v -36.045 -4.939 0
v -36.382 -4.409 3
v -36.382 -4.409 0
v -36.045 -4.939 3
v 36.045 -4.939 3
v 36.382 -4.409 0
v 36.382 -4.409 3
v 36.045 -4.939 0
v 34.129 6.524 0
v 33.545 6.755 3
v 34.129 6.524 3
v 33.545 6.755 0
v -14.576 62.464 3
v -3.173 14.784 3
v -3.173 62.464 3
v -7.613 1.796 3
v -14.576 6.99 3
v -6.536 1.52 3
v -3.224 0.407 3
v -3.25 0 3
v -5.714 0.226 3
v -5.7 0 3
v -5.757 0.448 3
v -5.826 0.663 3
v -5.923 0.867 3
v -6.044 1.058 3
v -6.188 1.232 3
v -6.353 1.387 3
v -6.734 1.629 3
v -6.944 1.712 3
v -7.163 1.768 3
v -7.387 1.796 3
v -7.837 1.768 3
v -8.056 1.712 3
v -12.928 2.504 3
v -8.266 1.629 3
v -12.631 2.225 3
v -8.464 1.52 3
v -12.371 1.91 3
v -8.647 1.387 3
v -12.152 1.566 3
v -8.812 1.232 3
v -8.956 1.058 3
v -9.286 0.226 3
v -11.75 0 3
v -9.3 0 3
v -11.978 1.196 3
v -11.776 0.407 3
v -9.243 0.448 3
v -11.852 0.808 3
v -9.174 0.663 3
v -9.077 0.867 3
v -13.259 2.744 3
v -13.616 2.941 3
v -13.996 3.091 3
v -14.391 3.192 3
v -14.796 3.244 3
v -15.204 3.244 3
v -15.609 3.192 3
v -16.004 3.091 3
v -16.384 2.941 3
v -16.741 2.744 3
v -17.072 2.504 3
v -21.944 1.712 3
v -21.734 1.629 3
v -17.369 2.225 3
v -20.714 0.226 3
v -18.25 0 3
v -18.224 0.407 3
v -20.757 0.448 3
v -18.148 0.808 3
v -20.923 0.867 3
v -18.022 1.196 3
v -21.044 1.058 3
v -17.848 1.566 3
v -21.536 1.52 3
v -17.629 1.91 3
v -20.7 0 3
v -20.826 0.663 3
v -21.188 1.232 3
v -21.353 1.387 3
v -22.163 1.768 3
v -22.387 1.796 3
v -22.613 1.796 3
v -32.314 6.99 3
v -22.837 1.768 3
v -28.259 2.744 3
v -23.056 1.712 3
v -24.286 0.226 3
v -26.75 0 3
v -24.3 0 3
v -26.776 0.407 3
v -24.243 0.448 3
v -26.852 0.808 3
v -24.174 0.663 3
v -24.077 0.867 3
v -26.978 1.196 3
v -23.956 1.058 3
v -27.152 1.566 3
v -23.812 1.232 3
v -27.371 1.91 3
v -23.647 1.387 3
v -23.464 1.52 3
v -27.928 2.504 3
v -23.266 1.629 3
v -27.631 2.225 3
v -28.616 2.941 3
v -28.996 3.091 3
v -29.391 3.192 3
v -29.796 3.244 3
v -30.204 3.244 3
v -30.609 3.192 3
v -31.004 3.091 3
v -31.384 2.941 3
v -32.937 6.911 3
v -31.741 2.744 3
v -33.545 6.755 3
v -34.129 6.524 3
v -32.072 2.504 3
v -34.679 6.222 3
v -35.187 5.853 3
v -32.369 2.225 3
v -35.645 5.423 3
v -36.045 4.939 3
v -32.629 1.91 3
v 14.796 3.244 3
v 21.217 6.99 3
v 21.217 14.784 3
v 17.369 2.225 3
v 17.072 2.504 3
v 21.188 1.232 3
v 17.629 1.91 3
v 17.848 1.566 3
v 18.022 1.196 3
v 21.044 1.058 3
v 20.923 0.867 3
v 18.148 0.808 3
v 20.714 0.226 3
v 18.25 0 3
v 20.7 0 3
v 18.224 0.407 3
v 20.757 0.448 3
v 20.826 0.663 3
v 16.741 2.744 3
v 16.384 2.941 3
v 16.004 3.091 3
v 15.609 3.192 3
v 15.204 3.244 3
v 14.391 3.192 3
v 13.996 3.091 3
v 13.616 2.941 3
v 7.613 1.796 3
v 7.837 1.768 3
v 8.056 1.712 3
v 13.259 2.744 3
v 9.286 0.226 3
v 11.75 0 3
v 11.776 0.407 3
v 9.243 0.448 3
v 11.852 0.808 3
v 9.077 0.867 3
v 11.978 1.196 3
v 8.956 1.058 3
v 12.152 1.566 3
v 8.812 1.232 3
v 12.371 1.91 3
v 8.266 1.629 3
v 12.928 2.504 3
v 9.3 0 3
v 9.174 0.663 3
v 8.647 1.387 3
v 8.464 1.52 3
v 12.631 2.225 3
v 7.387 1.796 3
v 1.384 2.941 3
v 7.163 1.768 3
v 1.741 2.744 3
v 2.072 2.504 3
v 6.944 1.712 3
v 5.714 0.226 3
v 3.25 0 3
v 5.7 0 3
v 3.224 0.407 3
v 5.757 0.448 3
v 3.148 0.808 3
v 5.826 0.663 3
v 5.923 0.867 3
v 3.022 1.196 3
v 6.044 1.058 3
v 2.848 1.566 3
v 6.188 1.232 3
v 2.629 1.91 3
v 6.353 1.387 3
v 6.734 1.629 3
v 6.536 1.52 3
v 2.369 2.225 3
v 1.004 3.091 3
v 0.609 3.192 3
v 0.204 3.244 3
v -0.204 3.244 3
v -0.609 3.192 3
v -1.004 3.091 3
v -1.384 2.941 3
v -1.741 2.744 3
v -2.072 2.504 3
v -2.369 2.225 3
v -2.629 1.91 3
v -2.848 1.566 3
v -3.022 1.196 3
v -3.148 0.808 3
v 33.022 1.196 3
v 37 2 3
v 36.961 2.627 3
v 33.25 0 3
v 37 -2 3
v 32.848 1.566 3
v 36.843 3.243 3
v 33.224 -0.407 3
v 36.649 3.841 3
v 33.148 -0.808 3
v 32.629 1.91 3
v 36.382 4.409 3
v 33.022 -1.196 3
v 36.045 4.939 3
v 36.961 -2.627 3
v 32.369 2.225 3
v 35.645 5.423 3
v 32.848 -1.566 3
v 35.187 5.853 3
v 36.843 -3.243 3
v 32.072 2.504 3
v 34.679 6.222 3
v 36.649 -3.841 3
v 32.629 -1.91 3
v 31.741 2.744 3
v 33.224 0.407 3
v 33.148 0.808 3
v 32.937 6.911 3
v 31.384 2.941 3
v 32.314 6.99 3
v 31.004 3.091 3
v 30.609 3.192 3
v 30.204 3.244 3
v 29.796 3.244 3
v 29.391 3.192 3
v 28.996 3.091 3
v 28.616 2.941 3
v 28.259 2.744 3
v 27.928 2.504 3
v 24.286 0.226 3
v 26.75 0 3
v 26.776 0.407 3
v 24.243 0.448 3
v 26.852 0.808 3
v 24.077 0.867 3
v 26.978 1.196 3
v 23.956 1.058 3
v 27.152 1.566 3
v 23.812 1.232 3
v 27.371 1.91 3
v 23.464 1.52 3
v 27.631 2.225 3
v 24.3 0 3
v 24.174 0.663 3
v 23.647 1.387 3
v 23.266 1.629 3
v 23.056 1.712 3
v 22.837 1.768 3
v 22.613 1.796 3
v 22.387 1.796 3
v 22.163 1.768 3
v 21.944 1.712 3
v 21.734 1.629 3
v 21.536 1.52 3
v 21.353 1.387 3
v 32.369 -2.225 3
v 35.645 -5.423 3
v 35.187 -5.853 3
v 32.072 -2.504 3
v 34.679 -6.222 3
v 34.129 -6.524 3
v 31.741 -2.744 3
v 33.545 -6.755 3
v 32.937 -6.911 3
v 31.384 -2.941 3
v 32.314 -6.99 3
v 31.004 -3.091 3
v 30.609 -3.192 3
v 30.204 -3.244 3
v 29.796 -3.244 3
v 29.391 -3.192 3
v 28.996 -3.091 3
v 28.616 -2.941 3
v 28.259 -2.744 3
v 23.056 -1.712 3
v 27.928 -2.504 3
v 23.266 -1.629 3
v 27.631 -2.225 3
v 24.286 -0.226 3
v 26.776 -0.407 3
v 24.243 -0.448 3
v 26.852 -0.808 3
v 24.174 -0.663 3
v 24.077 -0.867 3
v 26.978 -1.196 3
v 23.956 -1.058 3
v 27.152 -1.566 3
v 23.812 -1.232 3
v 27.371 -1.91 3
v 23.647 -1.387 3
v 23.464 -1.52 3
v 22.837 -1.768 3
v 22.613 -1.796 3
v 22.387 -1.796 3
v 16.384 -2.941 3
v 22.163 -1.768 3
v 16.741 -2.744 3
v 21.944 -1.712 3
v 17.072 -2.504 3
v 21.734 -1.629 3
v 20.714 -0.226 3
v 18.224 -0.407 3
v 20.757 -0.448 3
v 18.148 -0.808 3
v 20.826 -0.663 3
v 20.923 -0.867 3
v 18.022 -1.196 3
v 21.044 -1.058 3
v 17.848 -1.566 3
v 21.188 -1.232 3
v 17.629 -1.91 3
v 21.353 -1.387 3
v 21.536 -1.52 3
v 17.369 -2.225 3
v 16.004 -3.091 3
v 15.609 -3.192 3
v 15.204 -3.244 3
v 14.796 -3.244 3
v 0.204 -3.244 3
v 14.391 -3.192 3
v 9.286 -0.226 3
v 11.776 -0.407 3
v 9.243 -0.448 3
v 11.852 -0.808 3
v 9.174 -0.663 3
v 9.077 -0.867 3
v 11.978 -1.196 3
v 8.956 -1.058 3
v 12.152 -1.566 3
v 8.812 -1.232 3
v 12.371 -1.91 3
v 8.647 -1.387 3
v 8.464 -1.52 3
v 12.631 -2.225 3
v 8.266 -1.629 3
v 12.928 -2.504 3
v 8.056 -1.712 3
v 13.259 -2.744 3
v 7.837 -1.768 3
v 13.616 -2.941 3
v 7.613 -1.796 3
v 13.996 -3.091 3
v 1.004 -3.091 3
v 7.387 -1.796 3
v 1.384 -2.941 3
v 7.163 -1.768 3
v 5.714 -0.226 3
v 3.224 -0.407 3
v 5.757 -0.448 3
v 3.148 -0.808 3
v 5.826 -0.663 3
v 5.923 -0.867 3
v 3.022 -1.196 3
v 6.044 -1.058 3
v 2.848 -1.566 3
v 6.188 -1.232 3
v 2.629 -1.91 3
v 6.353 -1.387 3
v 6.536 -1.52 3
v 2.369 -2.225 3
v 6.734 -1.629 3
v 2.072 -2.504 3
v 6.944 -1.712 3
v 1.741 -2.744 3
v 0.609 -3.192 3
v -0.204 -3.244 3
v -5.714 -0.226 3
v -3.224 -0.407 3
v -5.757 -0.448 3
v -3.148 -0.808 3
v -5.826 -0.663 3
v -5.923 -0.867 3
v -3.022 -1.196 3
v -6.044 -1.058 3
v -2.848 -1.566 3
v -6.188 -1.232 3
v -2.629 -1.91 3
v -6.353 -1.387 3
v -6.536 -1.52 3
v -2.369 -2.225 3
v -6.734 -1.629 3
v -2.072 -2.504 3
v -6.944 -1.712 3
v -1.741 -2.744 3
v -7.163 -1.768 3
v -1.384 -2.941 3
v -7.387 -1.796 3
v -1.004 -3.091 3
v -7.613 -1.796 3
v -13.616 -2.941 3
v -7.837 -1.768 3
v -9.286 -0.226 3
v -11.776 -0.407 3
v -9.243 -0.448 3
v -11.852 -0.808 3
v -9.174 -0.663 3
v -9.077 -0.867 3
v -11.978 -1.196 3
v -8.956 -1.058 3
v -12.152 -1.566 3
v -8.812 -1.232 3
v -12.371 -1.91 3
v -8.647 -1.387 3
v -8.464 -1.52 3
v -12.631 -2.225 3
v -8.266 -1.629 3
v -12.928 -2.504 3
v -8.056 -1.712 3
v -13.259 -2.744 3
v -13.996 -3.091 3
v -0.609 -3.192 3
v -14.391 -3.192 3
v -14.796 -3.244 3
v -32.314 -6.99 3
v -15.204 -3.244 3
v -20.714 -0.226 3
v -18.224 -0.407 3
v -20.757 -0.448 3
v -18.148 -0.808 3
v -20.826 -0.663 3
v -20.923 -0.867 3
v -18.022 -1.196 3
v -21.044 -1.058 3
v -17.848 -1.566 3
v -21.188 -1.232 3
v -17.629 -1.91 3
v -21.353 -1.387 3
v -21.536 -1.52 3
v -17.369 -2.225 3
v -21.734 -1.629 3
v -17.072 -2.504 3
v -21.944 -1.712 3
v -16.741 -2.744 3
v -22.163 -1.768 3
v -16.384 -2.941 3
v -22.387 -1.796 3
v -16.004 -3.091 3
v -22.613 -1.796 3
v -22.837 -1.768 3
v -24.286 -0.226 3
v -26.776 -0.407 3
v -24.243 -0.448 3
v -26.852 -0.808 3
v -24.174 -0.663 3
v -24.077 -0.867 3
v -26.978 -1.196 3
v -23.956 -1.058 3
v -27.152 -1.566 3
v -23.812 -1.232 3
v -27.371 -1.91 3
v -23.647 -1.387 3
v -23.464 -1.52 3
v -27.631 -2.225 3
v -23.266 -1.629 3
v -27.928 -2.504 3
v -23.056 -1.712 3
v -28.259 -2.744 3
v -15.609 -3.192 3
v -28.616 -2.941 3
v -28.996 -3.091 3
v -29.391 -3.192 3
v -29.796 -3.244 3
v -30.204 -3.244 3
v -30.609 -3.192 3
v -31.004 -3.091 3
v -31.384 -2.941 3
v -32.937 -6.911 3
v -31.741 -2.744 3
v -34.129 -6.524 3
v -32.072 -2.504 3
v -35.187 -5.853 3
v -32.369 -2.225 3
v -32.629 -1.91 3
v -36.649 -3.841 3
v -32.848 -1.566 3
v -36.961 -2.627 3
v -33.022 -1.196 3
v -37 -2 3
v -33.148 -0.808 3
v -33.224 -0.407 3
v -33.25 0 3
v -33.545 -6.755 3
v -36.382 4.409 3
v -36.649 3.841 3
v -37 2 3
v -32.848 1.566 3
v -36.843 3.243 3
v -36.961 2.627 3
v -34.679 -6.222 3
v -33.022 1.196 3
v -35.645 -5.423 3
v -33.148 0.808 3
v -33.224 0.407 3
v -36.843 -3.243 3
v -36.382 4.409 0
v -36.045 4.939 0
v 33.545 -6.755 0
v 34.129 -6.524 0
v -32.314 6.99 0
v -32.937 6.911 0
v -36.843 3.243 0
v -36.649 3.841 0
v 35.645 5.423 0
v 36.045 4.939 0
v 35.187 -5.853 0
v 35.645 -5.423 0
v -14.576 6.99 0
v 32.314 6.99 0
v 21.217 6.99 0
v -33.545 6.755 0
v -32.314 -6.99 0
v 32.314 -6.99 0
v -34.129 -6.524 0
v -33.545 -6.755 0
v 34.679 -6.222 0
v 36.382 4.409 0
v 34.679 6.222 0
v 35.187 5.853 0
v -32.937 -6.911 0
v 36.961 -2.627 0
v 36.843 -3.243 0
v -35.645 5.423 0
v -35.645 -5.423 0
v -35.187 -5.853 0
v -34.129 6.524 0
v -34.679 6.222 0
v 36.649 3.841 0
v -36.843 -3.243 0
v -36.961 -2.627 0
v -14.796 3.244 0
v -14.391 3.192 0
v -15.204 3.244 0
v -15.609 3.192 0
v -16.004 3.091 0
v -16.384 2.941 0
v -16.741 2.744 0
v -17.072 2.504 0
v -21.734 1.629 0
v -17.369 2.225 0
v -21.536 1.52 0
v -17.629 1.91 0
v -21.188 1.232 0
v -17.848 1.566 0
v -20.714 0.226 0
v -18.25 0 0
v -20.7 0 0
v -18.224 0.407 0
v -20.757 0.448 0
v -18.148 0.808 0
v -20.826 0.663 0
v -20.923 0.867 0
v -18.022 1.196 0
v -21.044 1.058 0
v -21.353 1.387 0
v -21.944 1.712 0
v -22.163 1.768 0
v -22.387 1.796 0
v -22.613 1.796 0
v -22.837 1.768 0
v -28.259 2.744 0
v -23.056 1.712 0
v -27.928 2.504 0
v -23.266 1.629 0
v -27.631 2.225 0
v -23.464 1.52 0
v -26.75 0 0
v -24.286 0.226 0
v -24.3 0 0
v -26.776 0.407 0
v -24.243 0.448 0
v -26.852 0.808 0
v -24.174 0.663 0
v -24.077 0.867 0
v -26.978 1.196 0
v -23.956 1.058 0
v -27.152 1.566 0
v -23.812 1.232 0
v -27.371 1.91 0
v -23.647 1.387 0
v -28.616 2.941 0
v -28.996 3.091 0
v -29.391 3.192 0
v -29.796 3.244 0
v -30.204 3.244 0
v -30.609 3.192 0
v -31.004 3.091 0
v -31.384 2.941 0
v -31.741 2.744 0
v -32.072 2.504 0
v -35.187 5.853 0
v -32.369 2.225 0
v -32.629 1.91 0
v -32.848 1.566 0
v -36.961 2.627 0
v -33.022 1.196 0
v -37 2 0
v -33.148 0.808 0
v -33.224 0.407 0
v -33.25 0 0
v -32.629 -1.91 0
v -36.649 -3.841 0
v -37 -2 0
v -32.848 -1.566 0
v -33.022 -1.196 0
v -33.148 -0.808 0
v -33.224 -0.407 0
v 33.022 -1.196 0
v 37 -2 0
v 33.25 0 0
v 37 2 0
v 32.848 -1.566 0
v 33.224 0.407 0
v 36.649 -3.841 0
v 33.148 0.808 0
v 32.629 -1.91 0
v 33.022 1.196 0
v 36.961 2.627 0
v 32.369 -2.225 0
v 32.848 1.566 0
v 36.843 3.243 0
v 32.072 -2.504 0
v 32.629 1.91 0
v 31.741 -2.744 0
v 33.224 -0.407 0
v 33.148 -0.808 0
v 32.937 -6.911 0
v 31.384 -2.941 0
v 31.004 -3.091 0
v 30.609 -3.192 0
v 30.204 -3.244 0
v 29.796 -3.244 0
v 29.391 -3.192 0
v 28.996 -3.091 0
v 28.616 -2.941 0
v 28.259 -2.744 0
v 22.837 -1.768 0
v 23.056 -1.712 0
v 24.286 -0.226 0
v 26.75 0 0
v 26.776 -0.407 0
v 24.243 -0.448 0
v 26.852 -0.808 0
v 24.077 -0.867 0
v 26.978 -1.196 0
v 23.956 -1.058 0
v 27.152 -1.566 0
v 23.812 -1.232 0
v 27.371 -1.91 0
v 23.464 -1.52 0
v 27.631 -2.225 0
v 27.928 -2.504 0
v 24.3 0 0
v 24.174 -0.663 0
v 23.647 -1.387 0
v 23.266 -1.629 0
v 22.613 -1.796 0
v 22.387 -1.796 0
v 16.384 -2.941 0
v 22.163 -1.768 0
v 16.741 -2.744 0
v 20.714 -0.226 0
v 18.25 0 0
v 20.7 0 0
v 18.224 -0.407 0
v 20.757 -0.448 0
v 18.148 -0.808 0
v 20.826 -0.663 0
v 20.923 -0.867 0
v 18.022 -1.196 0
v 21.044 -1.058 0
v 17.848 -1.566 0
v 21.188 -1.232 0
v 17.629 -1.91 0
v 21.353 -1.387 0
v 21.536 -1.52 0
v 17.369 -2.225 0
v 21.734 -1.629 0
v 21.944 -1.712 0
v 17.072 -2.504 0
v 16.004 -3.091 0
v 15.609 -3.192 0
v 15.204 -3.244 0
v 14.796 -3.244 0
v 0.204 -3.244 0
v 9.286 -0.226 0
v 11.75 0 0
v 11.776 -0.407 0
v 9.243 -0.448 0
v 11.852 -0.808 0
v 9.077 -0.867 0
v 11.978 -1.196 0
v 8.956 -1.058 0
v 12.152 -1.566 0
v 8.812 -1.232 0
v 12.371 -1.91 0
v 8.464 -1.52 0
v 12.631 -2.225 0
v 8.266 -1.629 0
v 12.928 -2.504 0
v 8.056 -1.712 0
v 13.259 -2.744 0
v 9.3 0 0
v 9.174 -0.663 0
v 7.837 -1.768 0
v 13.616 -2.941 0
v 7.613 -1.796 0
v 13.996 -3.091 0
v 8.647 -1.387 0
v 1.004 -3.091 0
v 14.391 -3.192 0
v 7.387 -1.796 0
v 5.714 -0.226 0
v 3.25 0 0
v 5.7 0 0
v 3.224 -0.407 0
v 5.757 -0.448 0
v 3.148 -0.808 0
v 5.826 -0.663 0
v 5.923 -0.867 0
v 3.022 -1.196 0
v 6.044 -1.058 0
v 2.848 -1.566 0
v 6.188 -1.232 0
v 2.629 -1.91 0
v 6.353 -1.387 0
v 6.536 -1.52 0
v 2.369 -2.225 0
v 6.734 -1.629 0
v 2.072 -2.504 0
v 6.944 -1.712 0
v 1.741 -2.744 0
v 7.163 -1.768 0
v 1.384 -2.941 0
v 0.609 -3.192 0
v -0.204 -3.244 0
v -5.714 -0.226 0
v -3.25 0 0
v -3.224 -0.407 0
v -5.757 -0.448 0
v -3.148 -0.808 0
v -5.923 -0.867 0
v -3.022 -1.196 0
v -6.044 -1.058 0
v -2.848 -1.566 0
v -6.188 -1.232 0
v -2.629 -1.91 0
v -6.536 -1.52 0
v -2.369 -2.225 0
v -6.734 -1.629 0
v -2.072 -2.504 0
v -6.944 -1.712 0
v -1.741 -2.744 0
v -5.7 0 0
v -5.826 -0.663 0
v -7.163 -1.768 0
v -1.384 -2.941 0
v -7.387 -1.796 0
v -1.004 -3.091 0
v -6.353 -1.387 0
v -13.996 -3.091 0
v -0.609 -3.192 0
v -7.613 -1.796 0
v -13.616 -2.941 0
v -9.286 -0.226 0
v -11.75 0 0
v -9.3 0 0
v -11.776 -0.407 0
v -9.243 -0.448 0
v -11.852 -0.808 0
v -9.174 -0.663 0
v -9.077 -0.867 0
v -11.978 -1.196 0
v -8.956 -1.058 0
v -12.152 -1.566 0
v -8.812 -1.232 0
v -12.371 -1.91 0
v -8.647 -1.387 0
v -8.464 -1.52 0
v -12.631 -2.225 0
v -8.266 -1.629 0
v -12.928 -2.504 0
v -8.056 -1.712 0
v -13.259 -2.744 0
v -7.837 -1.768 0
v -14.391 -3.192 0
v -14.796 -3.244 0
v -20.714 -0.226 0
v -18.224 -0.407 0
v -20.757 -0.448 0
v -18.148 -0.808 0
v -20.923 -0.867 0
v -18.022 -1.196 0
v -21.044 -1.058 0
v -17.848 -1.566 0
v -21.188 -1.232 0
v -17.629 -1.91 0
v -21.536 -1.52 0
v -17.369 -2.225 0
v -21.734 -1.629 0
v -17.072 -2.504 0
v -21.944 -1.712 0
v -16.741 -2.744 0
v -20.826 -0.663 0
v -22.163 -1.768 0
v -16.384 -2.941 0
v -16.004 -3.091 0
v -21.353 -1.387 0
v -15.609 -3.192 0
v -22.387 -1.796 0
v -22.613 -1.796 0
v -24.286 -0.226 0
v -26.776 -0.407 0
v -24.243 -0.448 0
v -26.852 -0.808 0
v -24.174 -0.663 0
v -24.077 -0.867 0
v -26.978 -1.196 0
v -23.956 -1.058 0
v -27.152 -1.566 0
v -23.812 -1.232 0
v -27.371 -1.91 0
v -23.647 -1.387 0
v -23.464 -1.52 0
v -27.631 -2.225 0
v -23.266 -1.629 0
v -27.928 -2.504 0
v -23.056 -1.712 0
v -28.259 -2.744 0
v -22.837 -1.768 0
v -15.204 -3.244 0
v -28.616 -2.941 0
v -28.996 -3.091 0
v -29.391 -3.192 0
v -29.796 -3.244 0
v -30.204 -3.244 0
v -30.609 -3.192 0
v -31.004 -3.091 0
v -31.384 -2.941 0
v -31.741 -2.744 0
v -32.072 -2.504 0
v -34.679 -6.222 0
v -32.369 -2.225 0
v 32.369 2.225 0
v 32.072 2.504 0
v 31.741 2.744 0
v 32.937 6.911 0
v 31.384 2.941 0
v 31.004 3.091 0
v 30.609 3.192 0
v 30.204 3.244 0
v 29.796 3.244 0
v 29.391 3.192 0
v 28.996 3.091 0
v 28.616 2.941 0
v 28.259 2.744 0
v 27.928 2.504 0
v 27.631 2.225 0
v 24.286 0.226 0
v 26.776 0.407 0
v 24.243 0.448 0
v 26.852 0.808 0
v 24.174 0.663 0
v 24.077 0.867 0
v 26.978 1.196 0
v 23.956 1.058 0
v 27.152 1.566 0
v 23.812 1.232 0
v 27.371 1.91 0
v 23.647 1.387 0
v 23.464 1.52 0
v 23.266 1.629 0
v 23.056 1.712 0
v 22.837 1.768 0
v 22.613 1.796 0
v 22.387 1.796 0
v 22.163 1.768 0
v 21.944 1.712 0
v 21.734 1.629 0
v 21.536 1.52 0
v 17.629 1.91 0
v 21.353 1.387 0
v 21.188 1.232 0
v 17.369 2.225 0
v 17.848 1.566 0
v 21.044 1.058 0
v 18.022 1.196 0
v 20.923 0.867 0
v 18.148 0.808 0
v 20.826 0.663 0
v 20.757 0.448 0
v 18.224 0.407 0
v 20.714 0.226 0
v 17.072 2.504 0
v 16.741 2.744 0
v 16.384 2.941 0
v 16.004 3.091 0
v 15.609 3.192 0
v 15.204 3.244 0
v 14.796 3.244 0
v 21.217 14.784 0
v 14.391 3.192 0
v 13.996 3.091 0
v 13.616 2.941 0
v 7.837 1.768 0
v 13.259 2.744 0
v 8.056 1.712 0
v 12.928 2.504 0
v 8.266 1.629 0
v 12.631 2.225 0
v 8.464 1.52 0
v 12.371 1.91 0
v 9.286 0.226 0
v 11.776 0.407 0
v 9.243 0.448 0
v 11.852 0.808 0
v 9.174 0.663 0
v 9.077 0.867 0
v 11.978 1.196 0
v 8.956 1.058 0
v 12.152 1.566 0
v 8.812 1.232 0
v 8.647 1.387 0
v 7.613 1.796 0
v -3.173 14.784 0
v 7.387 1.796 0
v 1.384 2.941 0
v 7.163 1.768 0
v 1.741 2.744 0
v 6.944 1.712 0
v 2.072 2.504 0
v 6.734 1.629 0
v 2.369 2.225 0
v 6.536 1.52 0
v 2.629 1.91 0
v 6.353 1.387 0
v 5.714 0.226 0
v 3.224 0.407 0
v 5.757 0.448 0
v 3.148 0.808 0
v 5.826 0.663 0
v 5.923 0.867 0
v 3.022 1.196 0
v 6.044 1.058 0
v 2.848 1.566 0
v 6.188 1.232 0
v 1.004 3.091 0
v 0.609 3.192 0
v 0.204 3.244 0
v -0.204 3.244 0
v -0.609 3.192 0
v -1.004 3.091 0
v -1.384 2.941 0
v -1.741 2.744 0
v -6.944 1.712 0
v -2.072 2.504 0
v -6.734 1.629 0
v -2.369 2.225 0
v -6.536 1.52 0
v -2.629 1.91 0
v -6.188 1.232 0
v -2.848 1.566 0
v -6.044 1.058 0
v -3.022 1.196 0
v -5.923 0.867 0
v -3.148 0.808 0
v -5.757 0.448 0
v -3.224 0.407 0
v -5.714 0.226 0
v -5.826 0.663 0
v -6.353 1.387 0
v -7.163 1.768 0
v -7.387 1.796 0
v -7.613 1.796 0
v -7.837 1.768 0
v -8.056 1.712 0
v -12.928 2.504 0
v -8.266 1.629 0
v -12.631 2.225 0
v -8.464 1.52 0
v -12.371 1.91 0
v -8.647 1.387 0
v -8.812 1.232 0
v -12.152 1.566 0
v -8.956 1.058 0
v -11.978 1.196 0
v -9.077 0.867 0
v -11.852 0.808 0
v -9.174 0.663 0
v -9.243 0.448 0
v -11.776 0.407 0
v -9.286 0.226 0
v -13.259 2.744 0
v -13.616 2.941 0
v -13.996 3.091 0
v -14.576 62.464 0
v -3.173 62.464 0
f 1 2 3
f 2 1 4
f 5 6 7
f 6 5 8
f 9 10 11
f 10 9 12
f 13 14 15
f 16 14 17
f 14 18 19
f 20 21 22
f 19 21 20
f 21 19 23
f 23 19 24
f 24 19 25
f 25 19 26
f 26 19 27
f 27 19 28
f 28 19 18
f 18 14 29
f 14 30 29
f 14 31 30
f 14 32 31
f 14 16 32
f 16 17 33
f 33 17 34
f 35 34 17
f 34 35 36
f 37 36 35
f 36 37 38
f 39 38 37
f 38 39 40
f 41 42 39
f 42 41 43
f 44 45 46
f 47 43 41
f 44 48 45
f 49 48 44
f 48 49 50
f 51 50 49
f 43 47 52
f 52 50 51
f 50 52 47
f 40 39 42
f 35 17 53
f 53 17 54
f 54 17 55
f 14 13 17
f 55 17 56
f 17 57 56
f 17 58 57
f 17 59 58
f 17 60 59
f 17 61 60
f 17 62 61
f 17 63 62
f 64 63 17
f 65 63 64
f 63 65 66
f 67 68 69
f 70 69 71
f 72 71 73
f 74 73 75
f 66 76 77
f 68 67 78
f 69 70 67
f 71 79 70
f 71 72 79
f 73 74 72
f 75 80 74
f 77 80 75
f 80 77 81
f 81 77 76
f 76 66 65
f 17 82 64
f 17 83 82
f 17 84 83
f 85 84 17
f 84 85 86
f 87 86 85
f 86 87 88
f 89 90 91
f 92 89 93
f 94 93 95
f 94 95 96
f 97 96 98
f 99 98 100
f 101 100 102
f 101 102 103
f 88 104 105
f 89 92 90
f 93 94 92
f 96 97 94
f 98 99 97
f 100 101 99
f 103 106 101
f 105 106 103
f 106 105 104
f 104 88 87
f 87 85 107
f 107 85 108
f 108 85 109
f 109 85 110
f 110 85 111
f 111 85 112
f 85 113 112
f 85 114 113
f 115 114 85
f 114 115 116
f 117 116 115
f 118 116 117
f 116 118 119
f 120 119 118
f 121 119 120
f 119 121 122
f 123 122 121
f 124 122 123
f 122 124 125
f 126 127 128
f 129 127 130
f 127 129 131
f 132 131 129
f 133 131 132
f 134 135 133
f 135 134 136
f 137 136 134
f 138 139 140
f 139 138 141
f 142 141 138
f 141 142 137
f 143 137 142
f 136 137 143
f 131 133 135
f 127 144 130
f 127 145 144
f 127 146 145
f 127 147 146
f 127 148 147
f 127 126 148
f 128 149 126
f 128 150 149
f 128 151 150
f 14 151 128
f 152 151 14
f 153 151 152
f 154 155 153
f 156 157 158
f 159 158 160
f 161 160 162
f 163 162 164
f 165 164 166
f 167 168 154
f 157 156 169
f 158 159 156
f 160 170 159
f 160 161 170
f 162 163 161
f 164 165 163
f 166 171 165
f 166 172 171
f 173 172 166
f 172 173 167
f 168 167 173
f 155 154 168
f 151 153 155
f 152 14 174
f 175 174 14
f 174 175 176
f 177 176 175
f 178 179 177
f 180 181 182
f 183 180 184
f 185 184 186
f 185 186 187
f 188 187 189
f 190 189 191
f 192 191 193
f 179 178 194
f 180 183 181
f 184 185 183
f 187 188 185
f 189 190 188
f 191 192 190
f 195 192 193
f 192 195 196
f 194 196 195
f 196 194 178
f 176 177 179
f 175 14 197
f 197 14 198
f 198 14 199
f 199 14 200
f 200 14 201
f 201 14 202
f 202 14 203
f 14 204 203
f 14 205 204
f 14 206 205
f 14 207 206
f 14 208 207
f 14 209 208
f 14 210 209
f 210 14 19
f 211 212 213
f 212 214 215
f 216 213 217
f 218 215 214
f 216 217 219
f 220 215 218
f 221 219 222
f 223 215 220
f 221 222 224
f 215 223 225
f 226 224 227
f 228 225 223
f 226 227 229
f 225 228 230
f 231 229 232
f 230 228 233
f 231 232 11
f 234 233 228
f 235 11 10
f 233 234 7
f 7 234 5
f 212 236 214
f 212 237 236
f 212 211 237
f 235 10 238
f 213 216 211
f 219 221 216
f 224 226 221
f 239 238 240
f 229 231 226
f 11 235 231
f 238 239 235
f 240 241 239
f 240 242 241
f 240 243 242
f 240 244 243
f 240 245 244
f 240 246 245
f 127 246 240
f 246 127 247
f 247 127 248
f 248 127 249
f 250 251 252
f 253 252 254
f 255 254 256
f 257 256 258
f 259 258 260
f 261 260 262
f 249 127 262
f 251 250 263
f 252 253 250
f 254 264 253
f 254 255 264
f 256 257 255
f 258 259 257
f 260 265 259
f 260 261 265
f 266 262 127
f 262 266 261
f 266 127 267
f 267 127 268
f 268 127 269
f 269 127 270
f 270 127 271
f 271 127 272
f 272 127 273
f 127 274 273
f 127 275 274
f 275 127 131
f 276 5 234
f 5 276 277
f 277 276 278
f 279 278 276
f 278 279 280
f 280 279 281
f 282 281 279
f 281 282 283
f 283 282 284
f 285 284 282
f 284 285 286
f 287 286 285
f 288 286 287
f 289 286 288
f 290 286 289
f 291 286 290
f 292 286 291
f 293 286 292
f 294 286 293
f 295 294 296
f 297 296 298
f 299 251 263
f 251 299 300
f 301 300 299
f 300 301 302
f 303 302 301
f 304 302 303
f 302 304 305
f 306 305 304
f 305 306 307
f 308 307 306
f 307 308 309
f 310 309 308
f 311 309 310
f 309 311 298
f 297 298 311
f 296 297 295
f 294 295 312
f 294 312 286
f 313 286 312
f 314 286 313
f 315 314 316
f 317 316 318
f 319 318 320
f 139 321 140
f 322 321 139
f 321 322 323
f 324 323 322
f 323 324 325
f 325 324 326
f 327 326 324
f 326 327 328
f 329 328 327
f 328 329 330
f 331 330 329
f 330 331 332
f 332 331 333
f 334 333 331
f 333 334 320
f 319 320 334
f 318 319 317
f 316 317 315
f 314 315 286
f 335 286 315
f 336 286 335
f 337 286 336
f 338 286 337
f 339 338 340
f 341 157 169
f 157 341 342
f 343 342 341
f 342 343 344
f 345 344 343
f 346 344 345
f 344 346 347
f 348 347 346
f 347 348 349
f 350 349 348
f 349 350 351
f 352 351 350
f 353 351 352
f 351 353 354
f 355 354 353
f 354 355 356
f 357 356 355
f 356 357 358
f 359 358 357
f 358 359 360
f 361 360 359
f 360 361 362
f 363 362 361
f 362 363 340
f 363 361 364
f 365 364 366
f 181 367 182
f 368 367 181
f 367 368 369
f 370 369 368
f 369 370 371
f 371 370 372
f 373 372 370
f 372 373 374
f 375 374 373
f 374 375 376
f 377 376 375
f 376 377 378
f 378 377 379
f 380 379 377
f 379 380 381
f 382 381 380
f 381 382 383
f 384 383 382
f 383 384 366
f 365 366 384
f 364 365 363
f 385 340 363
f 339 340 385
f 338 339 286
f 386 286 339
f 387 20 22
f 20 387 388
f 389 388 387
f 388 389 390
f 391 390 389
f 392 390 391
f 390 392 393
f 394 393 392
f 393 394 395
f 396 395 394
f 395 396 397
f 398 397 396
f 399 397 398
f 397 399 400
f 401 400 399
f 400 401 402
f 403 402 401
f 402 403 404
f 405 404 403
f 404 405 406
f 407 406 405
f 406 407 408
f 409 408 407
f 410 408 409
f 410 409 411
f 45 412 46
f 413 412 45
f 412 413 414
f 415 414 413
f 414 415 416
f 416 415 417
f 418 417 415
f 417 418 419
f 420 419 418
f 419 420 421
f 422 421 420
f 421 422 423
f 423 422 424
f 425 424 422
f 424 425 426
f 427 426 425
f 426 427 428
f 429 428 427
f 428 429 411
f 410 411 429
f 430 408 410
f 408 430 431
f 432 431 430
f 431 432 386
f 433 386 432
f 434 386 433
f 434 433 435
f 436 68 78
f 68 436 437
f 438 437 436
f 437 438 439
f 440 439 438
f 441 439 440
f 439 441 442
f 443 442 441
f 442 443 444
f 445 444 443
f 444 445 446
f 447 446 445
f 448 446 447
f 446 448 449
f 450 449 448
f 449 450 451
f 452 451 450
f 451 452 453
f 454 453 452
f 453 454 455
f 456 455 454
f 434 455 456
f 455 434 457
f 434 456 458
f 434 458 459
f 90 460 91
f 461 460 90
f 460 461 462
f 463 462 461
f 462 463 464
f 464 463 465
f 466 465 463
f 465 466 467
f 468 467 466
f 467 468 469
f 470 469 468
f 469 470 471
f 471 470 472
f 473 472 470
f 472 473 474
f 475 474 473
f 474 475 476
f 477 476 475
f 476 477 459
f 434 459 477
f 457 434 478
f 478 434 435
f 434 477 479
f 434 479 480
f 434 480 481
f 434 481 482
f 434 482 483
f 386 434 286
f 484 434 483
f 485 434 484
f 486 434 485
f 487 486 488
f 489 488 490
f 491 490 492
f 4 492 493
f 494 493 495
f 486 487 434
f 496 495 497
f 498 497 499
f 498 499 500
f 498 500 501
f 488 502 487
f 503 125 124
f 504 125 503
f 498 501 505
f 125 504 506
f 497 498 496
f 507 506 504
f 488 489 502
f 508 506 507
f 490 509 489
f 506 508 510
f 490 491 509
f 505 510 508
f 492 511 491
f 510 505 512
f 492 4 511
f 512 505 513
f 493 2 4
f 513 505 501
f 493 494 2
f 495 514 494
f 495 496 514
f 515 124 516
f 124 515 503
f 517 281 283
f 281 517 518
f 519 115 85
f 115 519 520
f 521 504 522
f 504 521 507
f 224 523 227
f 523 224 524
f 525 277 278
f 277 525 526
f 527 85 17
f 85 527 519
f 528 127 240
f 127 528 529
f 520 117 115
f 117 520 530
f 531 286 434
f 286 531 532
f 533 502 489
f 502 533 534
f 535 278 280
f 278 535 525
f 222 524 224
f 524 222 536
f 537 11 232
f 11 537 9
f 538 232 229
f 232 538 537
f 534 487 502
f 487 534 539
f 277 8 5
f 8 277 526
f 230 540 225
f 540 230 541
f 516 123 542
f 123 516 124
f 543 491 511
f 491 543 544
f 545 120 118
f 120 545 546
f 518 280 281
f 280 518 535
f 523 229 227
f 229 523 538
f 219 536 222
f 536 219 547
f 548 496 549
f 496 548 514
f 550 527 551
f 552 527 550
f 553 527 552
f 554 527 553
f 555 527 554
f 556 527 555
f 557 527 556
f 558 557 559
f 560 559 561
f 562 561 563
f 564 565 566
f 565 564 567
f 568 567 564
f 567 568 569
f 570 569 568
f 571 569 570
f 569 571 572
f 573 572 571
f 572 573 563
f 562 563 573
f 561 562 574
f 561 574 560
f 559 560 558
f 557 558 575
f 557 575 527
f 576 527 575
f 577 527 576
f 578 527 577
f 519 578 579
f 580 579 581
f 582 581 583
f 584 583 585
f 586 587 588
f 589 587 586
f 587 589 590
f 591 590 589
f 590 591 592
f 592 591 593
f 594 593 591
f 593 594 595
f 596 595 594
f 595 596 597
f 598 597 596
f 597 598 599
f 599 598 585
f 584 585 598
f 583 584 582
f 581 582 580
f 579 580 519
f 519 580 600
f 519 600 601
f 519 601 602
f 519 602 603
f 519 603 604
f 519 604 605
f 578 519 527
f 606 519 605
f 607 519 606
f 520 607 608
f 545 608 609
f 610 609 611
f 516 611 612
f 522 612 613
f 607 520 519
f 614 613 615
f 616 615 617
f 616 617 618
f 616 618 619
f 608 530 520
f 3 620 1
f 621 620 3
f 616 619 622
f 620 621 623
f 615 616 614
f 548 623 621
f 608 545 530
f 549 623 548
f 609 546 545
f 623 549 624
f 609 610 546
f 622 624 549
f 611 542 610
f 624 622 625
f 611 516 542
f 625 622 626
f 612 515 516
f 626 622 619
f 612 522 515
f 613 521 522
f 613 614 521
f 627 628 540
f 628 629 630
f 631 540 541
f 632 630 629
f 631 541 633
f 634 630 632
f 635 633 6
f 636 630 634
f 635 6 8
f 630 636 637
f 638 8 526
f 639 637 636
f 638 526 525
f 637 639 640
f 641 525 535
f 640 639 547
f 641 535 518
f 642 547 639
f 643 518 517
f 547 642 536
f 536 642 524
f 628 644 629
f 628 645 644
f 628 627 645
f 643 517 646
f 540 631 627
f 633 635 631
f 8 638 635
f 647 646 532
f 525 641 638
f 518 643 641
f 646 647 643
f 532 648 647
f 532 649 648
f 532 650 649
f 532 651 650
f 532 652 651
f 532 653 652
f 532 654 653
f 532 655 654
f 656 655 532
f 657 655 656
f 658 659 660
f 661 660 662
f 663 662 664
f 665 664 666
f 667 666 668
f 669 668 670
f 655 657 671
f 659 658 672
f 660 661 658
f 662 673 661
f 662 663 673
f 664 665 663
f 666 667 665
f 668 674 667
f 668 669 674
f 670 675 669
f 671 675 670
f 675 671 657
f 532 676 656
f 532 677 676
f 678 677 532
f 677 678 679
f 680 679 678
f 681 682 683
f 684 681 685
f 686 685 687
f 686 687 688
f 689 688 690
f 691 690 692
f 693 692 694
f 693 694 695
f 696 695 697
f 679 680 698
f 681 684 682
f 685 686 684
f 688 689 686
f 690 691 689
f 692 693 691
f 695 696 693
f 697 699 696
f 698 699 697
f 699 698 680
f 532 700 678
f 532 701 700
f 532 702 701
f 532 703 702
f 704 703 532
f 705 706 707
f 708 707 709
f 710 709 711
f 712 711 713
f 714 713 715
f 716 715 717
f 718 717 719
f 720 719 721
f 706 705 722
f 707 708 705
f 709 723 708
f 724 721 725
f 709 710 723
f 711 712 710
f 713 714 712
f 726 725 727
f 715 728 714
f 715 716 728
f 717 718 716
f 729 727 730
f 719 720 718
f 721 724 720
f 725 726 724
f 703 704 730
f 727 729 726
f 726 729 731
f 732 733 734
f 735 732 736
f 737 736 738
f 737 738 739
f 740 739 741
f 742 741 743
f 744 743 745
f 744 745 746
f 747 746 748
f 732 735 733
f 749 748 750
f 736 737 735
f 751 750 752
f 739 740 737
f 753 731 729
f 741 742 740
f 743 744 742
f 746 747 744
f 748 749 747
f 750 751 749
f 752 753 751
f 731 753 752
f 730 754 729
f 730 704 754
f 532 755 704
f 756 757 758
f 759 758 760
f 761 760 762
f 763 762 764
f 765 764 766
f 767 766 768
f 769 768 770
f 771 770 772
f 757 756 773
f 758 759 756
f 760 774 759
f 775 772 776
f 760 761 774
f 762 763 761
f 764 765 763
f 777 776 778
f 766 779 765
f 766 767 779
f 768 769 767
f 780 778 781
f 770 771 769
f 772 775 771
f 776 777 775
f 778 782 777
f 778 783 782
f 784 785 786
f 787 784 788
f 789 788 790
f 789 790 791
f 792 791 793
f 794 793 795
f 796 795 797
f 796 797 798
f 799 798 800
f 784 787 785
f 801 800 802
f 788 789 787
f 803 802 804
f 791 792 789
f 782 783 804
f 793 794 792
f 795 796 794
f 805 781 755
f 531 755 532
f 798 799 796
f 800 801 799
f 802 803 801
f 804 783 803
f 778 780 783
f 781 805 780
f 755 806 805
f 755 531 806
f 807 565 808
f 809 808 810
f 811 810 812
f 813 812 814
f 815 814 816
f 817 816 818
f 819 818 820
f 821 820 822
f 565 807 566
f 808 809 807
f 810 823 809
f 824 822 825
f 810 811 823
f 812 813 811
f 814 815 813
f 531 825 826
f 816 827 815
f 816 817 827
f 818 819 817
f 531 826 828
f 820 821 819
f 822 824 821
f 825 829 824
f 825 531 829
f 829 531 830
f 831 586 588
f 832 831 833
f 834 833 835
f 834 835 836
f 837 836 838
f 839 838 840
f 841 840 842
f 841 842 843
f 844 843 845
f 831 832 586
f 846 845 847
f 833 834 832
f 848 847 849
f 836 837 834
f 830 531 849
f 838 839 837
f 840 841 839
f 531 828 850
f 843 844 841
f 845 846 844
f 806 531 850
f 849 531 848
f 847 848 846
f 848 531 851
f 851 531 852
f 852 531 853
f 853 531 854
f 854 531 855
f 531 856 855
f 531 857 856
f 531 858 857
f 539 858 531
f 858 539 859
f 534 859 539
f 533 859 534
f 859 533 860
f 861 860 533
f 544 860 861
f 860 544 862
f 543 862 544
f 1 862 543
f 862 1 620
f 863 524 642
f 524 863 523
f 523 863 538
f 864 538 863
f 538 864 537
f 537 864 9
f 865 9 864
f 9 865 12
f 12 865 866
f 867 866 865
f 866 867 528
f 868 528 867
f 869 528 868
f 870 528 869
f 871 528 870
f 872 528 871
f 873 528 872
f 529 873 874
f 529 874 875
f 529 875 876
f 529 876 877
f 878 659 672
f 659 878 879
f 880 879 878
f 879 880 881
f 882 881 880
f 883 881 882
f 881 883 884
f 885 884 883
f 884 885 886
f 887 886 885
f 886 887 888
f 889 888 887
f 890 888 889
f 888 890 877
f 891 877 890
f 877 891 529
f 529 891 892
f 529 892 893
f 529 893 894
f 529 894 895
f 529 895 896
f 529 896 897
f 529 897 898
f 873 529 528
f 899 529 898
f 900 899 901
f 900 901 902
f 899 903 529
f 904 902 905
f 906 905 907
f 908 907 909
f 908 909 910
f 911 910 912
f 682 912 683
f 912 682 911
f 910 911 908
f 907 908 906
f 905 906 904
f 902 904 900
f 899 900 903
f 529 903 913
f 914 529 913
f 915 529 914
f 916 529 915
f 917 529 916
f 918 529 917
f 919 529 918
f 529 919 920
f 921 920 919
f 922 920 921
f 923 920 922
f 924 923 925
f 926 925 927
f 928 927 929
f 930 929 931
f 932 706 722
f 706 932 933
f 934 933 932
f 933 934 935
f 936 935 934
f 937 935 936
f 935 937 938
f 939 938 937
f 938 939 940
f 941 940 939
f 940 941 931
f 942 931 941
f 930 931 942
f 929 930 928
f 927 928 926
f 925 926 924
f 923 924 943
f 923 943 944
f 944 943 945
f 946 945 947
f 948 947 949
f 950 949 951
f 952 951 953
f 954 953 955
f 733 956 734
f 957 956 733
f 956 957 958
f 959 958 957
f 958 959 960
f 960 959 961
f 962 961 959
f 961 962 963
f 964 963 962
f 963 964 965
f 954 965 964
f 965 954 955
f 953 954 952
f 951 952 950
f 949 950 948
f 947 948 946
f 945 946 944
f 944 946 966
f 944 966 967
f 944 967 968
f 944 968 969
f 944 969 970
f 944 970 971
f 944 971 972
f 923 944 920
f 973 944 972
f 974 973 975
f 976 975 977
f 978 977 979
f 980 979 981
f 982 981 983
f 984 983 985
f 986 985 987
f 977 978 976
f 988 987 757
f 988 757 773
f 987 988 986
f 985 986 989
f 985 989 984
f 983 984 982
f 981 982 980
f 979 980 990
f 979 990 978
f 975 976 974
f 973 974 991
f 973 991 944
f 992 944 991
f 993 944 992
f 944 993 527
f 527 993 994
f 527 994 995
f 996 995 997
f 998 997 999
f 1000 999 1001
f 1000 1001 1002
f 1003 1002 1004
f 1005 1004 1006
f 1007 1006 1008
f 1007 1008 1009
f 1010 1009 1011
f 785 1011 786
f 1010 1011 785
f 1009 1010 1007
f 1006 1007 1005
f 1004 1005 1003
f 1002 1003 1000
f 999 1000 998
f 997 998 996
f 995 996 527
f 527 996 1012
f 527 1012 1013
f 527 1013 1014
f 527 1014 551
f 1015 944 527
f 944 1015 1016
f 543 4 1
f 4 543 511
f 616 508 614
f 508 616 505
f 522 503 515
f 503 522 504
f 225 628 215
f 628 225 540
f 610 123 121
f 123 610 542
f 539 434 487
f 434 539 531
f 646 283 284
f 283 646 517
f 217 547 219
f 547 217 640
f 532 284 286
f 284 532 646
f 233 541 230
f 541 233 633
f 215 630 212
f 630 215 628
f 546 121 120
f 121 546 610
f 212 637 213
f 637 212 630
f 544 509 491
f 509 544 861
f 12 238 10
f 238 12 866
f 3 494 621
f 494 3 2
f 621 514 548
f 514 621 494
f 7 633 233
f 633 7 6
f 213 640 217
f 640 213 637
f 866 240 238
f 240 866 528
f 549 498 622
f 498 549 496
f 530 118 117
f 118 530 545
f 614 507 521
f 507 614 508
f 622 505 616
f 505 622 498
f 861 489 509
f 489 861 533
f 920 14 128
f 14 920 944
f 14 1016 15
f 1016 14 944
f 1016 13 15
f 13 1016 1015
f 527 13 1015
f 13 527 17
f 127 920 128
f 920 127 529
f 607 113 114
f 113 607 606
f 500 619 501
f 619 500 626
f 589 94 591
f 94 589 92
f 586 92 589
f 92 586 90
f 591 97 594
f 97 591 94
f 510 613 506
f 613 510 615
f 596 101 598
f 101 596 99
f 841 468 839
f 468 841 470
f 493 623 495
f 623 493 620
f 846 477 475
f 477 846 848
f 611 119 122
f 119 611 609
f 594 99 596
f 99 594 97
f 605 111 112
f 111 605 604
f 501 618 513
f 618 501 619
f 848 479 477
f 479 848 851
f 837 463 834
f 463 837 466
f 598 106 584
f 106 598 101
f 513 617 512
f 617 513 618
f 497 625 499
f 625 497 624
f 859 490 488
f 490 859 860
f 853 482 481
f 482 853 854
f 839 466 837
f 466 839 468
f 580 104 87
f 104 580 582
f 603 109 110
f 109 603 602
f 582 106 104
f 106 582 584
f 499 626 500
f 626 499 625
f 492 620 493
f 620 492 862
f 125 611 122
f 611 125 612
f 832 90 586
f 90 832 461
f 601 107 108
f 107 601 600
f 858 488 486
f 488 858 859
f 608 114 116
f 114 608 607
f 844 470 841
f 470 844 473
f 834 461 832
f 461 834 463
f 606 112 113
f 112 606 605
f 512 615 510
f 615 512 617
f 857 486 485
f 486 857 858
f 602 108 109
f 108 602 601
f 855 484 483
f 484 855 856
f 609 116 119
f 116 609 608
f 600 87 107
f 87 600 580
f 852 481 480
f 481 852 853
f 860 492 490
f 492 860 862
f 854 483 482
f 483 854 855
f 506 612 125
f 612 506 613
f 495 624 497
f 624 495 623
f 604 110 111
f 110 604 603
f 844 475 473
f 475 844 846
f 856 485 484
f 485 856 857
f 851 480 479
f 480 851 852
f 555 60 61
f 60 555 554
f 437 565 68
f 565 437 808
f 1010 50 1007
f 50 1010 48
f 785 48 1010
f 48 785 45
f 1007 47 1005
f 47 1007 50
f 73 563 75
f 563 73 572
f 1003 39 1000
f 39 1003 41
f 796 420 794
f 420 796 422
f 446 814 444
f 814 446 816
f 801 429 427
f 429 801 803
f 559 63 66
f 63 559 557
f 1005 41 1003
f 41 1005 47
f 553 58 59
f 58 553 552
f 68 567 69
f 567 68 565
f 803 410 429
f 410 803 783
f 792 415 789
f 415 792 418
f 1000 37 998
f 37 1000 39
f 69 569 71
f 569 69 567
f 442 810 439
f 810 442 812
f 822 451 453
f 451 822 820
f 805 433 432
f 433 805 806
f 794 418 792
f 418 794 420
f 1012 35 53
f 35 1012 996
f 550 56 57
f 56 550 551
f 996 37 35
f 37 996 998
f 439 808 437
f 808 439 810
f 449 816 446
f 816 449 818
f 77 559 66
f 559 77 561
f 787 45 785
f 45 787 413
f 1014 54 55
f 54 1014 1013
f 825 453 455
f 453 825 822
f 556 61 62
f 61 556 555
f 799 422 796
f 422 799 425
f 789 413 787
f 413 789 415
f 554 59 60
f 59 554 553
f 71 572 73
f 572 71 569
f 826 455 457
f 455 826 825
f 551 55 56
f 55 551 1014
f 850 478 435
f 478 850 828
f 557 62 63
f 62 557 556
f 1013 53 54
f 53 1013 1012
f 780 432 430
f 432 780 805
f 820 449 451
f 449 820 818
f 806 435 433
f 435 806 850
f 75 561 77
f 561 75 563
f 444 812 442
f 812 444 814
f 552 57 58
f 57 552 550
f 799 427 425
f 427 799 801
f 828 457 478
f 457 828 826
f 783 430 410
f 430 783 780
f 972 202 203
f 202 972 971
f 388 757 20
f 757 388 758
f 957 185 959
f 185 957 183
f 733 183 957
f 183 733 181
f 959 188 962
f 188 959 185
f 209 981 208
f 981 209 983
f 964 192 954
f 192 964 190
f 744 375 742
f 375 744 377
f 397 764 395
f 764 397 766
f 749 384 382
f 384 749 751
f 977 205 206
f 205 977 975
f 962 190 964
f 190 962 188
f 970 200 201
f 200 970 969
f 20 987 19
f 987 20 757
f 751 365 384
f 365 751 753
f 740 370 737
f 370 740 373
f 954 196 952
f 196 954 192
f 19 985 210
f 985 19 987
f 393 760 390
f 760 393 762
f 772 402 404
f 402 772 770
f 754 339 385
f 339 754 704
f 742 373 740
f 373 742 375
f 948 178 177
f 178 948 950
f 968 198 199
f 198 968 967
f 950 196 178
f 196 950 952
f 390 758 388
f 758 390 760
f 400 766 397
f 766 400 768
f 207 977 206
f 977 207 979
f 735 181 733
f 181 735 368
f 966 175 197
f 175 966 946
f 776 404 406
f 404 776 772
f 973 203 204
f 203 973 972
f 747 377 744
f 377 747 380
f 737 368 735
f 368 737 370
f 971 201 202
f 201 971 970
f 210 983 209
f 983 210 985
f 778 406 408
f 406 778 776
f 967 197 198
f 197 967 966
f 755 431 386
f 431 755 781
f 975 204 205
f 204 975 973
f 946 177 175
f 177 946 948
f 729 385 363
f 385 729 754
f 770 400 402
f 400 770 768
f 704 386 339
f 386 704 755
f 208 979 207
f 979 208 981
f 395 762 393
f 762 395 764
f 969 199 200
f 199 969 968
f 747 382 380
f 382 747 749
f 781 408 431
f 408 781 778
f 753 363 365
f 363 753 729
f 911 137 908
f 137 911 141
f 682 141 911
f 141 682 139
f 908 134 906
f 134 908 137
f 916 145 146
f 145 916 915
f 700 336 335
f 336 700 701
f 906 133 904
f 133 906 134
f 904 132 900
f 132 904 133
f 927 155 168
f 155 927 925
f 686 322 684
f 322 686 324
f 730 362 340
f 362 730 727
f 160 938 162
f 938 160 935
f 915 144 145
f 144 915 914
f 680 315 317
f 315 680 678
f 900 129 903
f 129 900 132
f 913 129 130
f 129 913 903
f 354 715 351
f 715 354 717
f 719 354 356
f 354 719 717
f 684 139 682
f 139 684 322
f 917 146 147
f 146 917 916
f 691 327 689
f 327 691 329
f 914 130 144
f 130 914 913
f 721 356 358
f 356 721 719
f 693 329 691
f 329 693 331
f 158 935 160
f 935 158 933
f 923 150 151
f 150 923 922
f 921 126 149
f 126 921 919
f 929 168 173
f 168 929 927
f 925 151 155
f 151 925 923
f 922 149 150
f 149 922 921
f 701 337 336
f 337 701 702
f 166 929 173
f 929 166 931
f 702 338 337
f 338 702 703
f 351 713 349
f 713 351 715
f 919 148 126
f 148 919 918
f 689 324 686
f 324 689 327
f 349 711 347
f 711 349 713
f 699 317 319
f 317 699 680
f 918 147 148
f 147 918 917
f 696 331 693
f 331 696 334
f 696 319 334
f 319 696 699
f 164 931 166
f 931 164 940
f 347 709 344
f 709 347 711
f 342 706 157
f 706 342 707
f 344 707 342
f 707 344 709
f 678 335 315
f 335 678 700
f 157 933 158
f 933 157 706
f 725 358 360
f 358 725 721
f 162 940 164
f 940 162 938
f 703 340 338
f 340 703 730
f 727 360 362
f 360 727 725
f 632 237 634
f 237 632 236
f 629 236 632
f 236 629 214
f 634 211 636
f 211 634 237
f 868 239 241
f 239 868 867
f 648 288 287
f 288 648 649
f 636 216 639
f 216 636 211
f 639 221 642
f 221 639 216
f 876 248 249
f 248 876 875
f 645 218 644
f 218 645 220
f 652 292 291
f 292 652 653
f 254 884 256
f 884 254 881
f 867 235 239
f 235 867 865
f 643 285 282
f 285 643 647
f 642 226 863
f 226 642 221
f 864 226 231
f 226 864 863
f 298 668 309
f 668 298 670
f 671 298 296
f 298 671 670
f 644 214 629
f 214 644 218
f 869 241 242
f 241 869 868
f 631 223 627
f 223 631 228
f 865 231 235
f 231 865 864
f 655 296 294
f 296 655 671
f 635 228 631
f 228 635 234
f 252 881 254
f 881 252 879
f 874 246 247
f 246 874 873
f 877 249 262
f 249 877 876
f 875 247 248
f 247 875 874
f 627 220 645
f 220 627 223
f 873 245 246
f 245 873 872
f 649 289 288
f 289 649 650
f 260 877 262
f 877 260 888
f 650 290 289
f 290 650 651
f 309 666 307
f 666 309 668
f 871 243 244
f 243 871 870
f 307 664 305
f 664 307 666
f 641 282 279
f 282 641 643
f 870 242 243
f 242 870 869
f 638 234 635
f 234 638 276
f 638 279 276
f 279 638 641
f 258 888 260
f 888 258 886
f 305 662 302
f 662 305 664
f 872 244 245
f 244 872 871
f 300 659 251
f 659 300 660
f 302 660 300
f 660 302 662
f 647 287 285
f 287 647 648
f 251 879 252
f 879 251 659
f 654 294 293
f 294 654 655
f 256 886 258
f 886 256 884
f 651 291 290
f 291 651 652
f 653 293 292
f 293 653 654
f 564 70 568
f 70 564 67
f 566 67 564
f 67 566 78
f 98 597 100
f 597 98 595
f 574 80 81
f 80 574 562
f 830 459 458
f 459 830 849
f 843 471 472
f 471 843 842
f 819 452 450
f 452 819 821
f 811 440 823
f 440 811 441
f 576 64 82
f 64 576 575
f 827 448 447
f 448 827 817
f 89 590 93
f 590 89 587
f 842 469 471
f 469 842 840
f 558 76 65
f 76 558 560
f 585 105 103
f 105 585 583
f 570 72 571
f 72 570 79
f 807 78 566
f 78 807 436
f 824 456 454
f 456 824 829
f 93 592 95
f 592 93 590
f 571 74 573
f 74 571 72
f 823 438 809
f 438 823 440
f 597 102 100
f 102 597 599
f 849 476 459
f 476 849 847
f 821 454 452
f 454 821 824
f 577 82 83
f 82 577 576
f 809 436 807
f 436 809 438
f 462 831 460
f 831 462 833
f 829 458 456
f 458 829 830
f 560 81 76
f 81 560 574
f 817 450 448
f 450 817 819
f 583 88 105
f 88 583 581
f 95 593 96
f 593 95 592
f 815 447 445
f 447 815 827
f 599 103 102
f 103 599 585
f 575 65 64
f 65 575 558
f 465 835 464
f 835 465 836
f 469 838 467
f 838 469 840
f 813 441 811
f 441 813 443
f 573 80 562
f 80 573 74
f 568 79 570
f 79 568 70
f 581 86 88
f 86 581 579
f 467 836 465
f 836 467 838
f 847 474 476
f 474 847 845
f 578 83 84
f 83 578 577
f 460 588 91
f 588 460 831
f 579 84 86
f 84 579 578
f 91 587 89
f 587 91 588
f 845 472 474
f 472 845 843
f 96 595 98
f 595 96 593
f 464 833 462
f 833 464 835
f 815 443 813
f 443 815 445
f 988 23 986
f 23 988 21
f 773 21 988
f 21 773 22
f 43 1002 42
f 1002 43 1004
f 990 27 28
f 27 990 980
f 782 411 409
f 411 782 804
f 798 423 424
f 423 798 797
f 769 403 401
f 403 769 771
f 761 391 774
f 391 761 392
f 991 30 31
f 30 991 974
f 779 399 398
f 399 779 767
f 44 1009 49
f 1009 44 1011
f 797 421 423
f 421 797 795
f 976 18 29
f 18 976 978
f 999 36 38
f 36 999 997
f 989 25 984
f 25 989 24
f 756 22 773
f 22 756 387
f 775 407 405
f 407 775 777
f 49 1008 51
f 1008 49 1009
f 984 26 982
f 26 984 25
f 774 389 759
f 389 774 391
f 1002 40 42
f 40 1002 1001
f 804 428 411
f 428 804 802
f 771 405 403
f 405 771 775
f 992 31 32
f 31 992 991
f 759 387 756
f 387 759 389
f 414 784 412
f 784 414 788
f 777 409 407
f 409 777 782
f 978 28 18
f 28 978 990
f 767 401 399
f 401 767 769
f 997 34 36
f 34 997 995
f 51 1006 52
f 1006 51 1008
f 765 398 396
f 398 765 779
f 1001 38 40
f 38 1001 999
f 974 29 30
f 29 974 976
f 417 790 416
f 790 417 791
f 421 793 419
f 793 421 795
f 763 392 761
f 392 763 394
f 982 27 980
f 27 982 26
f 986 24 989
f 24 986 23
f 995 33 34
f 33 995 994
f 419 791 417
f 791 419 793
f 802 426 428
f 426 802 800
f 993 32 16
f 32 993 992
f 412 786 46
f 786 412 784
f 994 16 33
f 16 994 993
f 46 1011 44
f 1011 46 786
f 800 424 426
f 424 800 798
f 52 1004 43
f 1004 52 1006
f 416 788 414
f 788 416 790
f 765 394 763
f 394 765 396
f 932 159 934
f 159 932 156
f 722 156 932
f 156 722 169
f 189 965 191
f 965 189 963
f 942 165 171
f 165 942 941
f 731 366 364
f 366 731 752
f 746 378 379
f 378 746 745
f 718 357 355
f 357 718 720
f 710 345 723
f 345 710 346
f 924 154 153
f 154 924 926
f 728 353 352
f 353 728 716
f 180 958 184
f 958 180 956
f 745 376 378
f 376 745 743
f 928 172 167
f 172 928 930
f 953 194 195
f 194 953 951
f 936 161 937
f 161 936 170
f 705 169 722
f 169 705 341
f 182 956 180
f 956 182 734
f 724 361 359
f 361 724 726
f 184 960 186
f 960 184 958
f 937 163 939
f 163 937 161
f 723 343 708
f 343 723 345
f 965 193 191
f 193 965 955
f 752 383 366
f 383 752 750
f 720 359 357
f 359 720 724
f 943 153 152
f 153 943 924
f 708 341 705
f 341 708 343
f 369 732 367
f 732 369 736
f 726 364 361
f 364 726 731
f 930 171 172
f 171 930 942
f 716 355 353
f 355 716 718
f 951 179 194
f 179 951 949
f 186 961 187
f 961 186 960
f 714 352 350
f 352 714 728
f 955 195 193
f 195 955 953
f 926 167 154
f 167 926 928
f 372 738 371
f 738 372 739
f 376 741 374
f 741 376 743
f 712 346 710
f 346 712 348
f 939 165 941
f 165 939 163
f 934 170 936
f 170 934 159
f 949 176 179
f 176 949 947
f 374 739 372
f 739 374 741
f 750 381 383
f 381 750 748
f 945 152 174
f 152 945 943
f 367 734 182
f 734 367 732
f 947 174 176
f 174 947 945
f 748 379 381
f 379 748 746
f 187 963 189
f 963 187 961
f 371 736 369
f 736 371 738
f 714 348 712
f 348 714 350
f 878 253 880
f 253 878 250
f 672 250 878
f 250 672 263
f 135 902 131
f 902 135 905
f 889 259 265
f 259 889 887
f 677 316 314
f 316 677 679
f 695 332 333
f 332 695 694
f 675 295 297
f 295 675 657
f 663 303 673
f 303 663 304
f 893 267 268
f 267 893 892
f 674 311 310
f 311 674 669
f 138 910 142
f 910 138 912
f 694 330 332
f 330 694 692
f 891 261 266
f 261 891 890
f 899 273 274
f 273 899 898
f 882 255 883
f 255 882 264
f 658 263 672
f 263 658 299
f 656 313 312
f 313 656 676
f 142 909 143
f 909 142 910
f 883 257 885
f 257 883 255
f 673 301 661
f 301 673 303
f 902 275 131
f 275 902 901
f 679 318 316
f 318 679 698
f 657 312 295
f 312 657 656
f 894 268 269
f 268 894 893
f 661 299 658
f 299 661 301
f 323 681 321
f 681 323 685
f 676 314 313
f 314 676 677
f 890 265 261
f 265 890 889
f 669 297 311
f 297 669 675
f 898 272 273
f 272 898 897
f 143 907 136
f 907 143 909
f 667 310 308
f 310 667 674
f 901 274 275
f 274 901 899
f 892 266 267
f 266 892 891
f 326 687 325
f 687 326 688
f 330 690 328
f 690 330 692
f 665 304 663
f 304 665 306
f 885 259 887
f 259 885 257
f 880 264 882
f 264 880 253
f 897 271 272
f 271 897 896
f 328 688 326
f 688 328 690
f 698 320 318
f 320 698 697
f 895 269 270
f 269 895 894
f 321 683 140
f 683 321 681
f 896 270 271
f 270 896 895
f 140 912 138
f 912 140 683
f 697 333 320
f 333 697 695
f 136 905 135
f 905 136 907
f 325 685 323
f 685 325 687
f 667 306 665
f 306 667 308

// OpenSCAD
$fn = 50;


difference() {
	union() {
		hull() {
			translate(v = [-32.0000000000, 2.0000000000, 0]) {
				cylinder(h = 3, r = 5);
			}
			translate(v = [32.0000000000, 2.0000000000, 0]) {
				cylinder(h = 3, r = 5);
			}
			translate(v = [-32.0000000000, -2.0000000000, 0]) {
				cylinder(h = 3, r = 5);
			}
			translate(v = [32.0000000000, -2.0000000000, 0]) {
				cylinder(h = 3, r = 5);
			}
		}
		translate(v = [0, 61.1111111111, 0]) {
			linear_extrude(height = 3) {
				text(font = "DejaVu Sans Mono:style=Bold", halign = "center", size = 57.0000000000, text = "L", valign = "top");
			}
		}
	}
	union() {
		translate(v = [-30.0000000000, 0.0000000000, 0]) {
			translate(v = [0, 0, -100]) {
				cylinder(h = 200, r = 3.2500000000);
			}
		}
		translate(v = [-15.0000000000, 0.0000000000, 0]) {
			translate(v = [0, 0, -100]) {
				cylinder(h = 200, r = 3.2500000000);
			}
		}
		translate(v = [0, 0, -100]) {
			cylinder(h = 200, r = 3.2500000000);
		}
		translate(v = [15.0000000000, 0.0000000000, 0]) {
			translate(v = [0, 0, -100]) {
				cylinder(h = 200, r = 3.2500000000);
			}
		}
		translate(v = [30.0000000000, 0.0000000000, 0]) {
			translate(v = [0, 0, -100]) {
				cylinder(h = 200, r = 3.2500000000);
			}
		}
		translate(v = [-30.0000000000, 0.0000000000, 0]) {
			translate(v = [0, 0, -100]) {
				cylinder(h = 200, r = 1.8000000000);
			}
		}
		translate(v = [-22.5000000000, 0.0000000000, 0]) {
			translate(v = [0, 0, -100]) {
				cylinder(h = 200, r = 1.8000000000);
			}
		}
		translate(v = [-15.0000000000, 0.0000000000, 0]) {
			translate(v = [0, 0, -100]) {
				cylinder(h = 200, r = 1.8000000000);
			}
		}
		translate(v = [-7.5000000000, 0.0000000000, 0]) {
			translate(v = [0, 0, -100]) {
				cylinder(h = 200, r = 1.8000000000);
			}
		}
		translate(v = [0, 0, -100]) {
			cylinder(h = 200, r = 1.8000000000);
		}
		translate(v = [7.5000000000, 0.0000000000, 0]) {
			translate(v = [0, 0, -100]) {
				cylinder(h = 200, r = 1.8000000000);
			}
		}
		translate(v = [15.0000000000, 0.0000000000, 0]) {
			translate(v = [0, 0, -100]) {
				cylinder(h = 200, r = 1.8000000000);
			}
		}
		translate(v = [22.5000000000, 0.0000000000, 0]) {
			translate(v = [0, 0, -100]) {
				cylinder(h = 200, r = 1.8000000000);
			}
		}
		translate(v = [30.0000000000, 0.0000000000, 0]) {
			translate(v = [0, 0, -100]) {
				cylinder(h = 200, r = 1.8000000000);
			}
		}
	}
}
